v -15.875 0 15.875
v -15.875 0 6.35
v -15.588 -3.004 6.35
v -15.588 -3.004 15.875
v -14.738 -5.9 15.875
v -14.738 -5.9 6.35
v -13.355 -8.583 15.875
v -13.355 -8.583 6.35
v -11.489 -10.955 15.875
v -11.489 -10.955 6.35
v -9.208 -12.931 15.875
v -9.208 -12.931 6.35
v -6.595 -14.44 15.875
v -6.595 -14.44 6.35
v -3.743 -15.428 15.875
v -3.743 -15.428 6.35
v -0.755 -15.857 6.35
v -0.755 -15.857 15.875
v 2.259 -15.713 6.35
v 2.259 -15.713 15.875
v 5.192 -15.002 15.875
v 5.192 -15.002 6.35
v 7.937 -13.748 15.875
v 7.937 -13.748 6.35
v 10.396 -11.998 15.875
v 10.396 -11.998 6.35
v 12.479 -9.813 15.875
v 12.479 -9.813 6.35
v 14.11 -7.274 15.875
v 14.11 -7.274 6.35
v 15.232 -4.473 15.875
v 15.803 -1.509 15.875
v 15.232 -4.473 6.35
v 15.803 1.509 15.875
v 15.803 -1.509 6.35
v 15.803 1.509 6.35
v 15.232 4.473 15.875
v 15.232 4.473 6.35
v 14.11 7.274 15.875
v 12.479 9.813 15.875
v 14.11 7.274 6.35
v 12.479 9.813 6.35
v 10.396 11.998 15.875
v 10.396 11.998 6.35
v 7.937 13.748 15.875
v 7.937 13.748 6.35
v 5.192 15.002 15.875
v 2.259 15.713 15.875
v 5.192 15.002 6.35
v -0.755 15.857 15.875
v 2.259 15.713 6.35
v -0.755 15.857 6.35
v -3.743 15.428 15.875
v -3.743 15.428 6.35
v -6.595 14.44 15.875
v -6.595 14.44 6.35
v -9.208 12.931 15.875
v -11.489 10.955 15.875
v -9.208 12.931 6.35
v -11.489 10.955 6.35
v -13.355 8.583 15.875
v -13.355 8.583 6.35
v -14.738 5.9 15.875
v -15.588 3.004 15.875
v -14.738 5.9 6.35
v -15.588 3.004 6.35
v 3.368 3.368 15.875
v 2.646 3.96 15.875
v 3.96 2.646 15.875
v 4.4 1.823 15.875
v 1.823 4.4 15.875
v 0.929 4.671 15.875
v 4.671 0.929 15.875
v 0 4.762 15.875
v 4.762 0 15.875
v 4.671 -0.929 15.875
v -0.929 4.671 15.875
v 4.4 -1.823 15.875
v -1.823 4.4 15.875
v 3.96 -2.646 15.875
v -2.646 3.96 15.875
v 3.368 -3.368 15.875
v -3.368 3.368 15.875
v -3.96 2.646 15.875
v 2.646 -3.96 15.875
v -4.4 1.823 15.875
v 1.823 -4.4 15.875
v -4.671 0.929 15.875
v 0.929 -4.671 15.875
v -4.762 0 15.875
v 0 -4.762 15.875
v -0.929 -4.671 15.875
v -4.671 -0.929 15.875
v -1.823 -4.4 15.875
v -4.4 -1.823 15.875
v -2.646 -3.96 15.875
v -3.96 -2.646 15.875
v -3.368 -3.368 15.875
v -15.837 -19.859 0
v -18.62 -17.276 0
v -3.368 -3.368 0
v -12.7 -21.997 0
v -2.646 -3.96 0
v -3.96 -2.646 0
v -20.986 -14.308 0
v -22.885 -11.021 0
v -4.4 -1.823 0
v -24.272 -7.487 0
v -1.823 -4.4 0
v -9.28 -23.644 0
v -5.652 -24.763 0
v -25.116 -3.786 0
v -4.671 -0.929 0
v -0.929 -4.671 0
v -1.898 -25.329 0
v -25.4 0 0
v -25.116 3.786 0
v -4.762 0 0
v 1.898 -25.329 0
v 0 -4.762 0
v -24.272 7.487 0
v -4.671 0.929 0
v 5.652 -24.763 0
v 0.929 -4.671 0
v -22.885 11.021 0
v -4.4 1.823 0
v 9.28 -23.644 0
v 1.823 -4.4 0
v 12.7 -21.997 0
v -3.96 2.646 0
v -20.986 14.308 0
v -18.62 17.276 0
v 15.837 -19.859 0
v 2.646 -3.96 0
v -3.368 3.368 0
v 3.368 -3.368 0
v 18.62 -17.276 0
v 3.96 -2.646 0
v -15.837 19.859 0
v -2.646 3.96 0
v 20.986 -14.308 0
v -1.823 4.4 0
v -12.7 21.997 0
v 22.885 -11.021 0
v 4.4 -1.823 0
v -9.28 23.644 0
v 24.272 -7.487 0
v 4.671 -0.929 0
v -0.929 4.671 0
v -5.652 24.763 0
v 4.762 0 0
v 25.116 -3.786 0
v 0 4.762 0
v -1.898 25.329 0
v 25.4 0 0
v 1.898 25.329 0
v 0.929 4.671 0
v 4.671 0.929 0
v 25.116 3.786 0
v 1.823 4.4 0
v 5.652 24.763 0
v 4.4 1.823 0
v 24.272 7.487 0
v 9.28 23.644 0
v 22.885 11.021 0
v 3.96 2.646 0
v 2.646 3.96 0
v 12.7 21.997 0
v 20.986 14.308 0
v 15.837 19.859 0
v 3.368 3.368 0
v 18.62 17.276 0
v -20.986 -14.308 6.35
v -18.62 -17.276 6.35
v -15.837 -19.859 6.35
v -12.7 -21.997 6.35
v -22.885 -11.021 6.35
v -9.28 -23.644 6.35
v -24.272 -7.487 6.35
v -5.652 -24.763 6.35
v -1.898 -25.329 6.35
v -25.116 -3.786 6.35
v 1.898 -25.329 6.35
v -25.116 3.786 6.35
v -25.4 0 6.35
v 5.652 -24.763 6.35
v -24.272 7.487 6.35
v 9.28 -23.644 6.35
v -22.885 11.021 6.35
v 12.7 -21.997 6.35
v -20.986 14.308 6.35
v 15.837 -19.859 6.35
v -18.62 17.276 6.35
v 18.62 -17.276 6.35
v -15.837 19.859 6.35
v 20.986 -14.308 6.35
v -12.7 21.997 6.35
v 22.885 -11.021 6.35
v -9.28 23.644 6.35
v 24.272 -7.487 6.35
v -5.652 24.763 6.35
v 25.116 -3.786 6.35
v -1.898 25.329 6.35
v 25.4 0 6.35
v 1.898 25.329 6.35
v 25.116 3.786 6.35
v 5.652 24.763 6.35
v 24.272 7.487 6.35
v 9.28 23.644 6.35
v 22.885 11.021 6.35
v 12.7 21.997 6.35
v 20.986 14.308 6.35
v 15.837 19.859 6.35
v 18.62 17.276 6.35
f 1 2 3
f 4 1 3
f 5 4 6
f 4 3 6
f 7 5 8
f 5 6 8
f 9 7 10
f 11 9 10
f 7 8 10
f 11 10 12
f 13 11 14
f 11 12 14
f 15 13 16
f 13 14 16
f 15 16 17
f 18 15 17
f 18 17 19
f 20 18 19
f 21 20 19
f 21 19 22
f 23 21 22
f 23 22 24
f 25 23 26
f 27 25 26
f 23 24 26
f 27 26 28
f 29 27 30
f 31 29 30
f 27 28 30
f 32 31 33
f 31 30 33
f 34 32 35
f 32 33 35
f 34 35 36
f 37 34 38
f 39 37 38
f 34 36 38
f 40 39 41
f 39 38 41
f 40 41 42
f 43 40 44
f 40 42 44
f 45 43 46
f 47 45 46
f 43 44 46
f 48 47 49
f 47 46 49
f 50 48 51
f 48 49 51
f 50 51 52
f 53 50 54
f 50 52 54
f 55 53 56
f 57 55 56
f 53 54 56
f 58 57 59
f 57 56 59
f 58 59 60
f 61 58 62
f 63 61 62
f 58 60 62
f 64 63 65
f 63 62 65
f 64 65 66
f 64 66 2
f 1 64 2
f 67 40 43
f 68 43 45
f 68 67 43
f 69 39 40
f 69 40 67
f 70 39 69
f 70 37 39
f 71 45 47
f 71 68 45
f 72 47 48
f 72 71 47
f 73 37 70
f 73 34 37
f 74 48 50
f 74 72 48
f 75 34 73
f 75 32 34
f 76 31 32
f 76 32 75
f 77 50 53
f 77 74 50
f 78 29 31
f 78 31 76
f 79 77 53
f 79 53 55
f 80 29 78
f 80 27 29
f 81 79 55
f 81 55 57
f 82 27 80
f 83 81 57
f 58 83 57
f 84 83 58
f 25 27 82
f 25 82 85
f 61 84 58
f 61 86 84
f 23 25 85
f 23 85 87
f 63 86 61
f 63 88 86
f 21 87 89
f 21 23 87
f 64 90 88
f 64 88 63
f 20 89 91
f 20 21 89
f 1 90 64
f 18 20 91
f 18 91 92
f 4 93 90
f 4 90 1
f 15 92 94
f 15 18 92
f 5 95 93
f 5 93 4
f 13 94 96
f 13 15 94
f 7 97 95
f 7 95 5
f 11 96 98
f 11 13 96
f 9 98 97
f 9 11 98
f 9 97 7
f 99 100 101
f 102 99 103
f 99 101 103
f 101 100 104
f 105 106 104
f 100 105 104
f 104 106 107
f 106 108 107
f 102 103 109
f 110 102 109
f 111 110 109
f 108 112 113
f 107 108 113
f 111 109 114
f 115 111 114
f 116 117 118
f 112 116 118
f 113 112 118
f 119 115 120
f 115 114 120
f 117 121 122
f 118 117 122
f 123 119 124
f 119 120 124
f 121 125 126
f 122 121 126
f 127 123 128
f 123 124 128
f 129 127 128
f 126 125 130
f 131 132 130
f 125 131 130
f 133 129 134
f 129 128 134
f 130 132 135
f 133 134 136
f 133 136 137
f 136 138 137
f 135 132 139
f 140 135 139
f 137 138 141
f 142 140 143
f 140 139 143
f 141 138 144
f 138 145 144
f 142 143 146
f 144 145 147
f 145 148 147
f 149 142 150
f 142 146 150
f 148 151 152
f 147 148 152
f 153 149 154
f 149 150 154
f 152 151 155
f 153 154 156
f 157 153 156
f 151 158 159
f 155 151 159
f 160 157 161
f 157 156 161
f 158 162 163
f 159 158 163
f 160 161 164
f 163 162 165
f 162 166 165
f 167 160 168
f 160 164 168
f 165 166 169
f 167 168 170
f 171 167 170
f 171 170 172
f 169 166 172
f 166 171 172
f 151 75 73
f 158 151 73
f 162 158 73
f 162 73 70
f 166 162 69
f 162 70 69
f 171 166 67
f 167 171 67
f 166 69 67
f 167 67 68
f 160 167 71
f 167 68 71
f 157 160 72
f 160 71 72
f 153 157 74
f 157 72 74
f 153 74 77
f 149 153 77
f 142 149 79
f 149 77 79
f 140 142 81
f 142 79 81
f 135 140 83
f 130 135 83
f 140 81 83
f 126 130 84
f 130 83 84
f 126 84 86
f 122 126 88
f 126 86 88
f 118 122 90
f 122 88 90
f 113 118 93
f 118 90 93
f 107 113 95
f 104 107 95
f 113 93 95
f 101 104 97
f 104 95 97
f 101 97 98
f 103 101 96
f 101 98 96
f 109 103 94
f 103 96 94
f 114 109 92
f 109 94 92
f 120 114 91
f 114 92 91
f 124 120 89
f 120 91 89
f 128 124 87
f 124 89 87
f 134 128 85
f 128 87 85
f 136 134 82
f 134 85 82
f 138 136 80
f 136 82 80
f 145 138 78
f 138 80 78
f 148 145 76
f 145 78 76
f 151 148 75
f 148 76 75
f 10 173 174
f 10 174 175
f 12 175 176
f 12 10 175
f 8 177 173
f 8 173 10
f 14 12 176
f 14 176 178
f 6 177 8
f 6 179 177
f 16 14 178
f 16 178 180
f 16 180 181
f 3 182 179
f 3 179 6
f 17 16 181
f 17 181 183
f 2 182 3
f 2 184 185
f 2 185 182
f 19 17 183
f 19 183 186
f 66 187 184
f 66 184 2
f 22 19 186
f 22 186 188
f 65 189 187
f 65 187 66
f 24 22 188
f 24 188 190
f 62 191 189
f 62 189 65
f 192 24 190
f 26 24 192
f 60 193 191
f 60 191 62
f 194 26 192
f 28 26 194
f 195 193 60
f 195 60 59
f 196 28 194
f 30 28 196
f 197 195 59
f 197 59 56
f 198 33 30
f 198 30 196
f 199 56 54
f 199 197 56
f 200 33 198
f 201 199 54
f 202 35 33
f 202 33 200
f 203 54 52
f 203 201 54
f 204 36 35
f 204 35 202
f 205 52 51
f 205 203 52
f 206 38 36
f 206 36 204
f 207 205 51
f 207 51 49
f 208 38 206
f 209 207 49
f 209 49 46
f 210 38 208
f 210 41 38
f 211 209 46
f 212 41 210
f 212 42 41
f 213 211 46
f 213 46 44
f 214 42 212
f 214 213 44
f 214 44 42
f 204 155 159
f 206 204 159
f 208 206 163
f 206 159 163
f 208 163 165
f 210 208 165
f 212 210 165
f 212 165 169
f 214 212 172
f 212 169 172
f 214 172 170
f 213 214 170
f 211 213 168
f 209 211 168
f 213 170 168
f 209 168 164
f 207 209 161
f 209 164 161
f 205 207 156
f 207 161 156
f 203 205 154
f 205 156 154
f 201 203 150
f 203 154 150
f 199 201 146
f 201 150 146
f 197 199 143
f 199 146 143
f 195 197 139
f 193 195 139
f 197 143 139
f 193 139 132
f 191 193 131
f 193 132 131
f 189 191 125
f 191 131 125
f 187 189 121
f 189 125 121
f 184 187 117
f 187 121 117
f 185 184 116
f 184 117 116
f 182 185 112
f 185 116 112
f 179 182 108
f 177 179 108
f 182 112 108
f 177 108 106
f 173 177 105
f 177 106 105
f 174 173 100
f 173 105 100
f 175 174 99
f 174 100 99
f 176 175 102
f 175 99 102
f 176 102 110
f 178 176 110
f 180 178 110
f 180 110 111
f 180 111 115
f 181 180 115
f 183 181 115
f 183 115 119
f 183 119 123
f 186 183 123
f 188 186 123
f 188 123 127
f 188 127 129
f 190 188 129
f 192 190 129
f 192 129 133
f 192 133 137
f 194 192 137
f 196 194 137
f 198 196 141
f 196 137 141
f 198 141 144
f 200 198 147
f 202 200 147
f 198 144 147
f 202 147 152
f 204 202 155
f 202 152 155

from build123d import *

# Parameters (mm, degrees)
SKETCH1_R           = 25.4
BOSS_EXTRUDE1_DEPTH = 6.35
SKETCH2_R           = 15.875
BOSS_EXTRUDE2_DEPTH = 9.525
SKETCH3_R           = 4.7625
CUT_EXTRUDE1_DEPTH  = 15.875


with BuildPart() as part:
    # Sketch1 → Boss-Extrude1 (new body)
    with BuildSketch(Plane.XY):
        Circle(SKETCH1_R)
    extrude(amount=BOSS_EXTRUDE1_DEPTH)

    # Sketch2 → Boss-Extrude2 (add)
    with BuildSketch(Plane.XY.offset(6.35)):
        with Locations(Location((0, 0, 0), (0, 0, 180))):
            Circle(SKETCH2_R)
    extrude(amount=BOSS_EXTRUDE2_DEPTH)

    # Sketch3 → Cut-Extrude1 (cut)
    with BuildSketch(Plane.XY.offset(15.875)):
        Circle(SKETCH3_R)
    extrude(amount=-CUT_EXTRUDE1_DEPTH, mode=Mode.SUBTRACT)


solid = part.part
